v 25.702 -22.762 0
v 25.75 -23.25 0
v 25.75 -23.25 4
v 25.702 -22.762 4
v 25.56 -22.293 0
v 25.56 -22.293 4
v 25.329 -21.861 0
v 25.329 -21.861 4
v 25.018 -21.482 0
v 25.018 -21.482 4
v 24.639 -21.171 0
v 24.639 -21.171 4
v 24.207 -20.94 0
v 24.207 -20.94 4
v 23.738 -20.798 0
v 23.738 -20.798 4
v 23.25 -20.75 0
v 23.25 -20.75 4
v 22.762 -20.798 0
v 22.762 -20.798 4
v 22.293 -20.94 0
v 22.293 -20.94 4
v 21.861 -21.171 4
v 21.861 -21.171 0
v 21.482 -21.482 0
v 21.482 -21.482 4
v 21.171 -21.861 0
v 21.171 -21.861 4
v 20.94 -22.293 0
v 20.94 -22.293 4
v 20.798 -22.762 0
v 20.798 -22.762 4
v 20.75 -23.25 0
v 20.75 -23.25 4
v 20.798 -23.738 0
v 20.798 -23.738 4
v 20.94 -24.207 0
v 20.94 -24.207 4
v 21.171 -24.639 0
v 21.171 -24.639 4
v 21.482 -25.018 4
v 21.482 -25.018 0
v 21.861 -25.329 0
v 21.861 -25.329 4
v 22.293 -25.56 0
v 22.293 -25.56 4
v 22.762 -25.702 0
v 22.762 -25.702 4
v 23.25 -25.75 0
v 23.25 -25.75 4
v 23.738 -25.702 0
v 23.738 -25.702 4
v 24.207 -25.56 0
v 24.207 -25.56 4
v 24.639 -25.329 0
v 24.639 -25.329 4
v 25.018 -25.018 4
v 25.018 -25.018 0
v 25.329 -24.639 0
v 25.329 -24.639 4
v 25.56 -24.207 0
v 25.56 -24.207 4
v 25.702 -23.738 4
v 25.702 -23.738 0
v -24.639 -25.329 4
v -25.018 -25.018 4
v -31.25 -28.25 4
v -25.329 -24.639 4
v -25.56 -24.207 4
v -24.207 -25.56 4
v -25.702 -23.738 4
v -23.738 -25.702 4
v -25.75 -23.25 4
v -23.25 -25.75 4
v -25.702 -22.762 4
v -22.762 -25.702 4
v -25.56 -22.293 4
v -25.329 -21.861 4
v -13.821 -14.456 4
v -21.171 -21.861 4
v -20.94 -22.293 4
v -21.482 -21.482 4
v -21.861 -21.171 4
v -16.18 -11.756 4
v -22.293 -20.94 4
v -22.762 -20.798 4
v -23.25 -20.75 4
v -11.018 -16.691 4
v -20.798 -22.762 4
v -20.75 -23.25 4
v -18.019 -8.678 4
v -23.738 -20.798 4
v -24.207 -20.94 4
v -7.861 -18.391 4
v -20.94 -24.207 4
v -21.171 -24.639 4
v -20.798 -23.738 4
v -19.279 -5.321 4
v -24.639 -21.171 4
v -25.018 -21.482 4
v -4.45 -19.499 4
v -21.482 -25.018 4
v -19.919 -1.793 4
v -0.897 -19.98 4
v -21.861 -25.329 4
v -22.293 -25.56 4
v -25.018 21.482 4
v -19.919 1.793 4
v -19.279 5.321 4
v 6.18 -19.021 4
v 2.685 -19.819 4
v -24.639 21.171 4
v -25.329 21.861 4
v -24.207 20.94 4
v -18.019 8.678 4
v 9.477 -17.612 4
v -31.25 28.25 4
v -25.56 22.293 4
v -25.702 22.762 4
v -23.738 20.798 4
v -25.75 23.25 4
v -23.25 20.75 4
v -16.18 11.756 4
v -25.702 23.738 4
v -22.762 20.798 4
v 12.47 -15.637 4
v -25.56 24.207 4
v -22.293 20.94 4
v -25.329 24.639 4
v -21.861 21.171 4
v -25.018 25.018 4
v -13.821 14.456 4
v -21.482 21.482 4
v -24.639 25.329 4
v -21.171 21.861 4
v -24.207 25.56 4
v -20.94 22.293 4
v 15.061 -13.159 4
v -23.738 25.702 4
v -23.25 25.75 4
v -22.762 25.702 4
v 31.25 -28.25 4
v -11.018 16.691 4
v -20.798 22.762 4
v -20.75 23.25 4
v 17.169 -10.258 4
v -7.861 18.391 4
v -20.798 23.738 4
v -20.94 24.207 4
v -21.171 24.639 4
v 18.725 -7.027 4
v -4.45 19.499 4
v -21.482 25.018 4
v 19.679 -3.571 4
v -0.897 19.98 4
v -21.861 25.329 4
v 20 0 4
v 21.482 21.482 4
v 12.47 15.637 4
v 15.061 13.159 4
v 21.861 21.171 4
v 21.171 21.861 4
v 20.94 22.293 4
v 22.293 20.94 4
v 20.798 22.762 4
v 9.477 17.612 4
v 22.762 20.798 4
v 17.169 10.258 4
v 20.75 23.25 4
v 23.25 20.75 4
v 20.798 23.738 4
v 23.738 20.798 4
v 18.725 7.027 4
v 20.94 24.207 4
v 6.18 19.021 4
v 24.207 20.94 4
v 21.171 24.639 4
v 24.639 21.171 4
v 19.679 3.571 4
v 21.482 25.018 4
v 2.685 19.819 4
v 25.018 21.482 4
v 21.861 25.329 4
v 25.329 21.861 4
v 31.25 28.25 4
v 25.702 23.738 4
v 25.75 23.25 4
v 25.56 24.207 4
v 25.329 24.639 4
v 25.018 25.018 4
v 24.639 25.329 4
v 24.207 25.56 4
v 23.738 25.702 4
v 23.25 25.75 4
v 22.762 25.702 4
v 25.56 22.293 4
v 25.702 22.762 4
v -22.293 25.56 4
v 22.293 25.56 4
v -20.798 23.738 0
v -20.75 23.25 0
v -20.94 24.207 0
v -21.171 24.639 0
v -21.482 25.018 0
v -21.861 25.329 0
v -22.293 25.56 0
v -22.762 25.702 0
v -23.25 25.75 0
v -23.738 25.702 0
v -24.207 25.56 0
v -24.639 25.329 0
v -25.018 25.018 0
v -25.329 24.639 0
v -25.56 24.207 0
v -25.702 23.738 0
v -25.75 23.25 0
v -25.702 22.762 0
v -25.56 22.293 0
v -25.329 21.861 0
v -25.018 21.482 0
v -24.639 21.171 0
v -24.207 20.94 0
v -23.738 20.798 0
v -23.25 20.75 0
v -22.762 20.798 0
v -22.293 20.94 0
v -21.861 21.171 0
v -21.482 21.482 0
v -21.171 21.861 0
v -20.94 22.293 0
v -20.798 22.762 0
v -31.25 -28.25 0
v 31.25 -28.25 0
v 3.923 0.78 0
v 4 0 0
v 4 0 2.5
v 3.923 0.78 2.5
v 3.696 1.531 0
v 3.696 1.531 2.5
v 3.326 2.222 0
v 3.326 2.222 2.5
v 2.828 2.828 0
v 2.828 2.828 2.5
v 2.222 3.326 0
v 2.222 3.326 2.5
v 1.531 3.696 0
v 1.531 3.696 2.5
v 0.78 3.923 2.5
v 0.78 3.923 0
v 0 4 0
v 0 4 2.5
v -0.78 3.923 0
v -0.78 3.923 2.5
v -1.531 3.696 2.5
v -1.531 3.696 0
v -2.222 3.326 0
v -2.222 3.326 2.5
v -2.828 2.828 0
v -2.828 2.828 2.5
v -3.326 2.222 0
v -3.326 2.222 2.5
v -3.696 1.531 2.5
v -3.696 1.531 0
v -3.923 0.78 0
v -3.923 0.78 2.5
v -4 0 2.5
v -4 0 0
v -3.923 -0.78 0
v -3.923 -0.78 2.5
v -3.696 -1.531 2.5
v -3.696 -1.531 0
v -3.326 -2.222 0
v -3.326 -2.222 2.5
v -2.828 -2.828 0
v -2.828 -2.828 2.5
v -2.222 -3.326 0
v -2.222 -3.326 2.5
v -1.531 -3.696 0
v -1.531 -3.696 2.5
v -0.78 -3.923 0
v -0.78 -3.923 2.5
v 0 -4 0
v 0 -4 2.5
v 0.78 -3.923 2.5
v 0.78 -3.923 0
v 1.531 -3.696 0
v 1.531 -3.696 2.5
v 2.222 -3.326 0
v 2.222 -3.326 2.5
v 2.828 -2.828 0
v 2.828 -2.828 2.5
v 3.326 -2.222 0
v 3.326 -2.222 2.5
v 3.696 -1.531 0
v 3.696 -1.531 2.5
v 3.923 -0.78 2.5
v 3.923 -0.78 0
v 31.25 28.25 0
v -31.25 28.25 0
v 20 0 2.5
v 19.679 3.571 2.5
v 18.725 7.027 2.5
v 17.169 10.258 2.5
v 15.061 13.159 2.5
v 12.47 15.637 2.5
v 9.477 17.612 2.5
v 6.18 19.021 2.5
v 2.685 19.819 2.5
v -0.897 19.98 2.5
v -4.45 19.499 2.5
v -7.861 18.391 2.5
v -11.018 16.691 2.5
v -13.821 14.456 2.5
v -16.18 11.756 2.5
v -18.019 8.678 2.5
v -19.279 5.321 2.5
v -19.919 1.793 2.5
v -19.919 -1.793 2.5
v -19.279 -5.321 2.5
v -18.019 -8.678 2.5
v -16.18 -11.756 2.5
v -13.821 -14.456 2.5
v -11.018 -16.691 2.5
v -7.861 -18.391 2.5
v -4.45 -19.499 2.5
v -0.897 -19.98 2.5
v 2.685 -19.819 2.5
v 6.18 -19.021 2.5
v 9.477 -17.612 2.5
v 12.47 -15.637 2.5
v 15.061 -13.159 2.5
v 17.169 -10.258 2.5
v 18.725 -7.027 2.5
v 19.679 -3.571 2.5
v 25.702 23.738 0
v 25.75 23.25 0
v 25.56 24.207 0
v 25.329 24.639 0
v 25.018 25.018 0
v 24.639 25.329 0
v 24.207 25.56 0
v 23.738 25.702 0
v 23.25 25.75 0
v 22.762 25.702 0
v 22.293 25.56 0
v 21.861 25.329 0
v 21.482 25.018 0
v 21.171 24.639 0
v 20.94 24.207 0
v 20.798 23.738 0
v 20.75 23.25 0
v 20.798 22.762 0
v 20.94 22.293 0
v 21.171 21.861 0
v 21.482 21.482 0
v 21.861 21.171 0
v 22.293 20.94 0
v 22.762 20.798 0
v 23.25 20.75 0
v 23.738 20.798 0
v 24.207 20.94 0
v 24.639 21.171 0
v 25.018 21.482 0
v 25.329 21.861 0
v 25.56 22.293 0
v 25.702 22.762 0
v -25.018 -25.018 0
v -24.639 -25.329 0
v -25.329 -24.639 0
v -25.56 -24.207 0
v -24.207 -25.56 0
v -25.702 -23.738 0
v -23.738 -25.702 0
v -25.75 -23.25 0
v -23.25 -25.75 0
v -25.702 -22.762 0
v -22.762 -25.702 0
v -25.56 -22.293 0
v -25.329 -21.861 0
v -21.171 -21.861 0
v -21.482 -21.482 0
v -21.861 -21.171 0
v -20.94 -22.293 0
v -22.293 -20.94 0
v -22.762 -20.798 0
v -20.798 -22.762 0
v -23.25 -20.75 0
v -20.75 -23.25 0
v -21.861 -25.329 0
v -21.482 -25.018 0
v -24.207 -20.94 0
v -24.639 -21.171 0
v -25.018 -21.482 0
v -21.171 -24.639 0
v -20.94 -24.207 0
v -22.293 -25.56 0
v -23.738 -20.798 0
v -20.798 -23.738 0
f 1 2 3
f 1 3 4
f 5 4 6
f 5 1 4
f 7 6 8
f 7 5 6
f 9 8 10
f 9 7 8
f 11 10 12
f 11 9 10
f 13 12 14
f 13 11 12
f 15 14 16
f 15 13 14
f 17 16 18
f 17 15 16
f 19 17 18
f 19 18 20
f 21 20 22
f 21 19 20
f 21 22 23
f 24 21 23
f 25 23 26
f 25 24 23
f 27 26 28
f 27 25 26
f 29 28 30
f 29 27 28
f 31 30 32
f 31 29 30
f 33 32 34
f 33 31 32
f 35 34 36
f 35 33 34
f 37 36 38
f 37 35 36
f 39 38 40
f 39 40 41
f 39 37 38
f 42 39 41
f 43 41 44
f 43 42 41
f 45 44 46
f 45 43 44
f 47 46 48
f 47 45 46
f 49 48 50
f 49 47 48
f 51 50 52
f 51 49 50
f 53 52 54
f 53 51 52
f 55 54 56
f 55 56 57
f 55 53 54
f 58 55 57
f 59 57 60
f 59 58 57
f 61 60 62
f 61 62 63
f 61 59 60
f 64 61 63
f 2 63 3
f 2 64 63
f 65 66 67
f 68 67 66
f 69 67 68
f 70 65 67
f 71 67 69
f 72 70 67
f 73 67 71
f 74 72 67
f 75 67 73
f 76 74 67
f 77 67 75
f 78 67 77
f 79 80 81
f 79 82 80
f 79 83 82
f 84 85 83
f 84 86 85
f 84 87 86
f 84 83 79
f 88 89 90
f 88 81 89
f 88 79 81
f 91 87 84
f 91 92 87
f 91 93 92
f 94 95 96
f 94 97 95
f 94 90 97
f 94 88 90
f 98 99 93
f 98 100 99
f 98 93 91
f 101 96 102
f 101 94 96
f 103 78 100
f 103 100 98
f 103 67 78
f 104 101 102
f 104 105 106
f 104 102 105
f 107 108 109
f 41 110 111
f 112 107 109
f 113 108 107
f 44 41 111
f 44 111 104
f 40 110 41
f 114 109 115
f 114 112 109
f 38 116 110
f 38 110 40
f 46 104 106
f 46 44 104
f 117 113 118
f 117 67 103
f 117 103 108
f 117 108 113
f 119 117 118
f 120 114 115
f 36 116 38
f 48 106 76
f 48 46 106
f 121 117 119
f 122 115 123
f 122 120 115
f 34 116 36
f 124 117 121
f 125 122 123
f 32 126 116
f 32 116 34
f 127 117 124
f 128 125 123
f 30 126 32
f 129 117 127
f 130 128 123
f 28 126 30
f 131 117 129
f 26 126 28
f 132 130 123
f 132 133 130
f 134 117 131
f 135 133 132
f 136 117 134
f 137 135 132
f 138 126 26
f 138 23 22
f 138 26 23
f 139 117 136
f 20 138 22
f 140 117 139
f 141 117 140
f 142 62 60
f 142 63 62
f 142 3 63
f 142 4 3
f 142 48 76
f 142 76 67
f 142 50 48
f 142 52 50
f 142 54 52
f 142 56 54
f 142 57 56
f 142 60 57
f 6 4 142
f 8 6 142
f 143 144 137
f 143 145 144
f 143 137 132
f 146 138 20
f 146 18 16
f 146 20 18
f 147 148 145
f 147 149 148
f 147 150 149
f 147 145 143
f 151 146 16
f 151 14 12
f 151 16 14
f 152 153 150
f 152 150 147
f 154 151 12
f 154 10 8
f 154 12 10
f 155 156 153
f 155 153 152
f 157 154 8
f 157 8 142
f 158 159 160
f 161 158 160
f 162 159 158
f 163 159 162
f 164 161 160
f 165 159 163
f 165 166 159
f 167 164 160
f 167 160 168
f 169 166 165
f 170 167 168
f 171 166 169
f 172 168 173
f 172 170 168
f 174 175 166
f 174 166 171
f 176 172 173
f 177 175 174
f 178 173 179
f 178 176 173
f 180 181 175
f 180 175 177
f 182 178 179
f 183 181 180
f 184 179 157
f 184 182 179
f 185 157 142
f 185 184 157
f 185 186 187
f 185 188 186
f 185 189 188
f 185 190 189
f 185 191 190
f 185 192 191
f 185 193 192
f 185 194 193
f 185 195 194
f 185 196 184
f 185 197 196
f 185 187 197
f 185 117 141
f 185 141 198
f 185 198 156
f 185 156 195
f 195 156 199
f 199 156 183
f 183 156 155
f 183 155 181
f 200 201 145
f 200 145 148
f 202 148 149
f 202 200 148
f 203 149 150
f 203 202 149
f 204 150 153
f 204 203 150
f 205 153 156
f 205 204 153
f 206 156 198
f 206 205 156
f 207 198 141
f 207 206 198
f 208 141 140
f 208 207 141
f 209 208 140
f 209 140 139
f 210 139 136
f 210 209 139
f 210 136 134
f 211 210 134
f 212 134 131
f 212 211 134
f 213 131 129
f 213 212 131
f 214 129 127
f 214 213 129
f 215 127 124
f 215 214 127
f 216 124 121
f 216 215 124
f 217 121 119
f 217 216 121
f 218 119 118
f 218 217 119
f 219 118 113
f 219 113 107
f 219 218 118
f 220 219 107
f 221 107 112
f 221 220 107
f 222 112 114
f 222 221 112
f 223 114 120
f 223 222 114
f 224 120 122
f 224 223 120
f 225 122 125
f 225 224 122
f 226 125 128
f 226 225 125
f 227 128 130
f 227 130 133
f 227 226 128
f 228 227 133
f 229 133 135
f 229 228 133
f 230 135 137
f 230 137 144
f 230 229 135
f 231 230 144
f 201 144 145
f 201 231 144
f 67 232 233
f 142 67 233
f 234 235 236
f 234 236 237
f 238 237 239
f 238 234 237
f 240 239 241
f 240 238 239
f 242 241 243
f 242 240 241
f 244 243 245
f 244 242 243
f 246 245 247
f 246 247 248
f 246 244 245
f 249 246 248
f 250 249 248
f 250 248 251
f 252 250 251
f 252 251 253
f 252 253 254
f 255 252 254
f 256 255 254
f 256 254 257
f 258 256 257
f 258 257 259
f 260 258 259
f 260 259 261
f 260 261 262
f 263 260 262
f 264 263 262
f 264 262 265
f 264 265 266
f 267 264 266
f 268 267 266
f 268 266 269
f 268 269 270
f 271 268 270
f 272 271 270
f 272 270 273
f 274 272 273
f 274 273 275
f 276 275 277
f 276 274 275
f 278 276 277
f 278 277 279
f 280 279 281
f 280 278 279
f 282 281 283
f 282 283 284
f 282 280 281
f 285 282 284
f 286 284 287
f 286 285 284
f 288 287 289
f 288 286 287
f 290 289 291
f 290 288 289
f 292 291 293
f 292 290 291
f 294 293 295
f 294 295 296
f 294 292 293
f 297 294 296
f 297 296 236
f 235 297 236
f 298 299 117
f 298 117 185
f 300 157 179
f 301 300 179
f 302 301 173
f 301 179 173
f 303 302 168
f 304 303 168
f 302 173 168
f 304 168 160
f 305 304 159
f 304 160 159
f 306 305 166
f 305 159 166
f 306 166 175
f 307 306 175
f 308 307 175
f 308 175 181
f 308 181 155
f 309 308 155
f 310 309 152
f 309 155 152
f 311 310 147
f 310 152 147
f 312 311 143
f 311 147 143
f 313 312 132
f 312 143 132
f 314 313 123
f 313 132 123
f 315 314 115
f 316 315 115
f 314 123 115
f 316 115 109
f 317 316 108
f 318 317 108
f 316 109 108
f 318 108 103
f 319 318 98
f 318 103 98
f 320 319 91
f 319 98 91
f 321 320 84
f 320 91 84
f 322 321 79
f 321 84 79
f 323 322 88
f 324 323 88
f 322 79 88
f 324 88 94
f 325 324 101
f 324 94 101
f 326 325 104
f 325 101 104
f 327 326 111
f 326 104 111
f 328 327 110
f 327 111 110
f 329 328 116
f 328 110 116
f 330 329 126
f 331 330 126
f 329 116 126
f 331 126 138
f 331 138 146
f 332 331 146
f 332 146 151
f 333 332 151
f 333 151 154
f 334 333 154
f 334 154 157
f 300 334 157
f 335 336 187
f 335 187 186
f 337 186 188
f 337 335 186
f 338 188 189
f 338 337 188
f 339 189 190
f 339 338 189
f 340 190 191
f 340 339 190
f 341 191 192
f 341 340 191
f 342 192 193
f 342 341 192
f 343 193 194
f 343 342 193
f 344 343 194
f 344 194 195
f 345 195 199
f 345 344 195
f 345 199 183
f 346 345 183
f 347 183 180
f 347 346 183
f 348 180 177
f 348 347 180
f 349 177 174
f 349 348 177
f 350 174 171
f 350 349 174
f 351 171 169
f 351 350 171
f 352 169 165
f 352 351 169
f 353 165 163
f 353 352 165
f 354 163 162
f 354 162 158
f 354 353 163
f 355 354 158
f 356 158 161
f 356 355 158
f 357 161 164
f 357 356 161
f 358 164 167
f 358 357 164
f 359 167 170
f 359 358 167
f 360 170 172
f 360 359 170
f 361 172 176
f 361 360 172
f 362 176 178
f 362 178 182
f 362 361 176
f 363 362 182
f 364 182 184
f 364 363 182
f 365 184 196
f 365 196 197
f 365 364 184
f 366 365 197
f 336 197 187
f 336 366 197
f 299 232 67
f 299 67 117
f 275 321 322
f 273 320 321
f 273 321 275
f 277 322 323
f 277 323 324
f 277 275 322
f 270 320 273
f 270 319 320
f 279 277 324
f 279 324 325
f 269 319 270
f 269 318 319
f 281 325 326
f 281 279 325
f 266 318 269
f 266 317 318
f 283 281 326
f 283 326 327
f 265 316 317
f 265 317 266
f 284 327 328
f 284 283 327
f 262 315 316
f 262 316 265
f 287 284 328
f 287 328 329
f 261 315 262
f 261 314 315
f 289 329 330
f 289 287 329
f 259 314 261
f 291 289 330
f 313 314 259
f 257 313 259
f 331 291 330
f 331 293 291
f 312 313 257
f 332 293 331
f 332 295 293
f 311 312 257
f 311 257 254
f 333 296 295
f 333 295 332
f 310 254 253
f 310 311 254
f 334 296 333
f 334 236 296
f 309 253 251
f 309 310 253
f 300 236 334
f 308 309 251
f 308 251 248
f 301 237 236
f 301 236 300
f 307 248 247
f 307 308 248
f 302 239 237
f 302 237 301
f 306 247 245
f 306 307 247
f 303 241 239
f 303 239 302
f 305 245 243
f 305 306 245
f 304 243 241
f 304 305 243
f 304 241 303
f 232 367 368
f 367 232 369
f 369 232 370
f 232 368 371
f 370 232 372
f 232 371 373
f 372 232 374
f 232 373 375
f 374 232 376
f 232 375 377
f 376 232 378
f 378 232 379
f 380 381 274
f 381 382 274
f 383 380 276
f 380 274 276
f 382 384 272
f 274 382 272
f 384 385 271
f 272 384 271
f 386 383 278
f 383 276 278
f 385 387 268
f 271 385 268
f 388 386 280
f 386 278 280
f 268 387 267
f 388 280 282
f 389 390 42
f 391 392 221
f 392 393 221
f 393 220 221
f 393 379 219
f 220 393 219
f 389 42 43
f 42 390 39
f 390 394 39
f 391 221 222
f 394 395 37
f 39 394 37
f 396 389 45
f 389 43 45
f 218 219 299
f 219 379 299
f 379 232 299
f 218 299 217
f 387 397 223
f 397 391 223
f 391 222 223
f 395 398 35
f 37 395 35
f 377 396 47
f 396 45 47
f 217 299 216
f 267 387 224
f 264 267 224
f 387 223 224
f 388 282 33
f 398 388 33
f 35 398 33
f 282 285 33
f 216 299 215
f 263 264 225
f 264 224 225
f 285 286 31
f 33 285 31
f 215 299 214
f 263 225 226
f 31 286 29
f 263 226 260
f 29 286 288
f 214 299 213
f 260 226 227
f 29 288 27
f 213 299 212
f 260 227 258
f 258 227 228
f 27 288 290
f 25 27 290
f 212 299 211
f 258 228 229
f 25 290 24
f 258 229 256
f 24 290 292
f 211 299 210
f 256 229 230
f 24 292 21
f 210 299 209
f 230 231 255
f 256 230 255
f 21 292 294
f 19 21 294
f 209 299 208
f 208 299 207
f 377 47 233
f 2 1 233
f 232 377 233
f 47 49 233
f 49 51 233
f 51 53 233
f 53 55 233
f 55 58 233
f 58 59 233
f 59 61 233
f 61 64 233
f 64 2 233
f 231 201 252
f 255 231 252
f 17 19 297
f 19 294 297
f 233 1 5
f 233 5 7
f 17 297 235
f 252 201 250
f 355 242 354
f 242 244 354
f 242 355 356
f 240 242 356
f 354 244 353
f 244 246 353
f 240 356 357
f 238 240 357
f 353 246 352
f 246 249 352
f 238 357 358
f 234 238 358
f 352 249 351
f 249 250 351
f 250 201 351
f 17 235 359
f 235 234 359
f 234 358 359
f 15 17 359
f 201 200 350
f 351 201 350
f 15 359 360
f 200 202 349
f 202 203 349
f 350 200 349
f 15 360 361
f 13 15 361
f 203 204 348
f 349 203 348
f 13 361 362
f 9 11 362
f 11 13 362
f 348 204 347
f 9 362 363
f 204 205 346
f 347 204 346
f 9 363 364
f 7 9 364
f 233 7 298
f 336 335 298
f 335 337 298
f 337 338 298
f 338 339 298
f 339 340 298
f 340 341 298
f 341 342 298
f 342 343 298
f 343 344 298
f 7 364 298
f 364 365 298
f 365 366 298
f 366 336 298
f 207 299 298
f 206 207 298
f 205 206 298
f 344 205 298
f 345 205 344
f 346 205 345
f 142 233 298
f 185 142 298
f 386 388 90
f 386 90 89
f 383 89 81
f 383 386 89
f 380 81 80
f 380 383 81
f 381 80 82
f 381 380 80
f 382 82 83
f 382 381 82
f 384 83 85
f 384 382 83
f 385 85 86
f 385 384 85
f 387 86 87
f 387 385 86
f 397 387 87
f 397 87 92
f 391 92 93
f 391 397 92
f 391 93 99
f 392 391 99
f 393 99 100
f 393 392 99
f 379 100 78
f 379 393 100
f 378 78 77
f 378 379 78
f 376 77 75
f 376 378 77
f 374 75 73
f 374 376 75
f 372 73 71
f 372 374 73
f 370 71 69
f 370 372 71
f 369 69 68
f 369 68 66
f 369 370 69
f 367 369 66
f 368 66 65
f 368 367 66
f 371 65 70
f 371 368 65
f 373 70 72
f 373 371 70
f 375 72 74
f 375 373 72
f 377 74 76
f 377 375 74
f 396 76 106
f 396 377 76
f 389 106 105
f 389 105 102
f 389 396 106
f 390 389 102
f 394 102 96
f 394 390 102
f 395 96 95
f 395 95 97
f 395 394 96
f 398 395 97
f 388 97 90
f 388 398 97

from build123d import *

# Parameters (mm, degrees)
SKETCH_W      = 62.5
SKETCH_H      = 56.5
SKETCH_R      = 2.5
SKETCH_R_2    = 4
PAD_DEPTH     = 4
SKETCH001_R   = 20
SKETCH001_R_2 = 4
POCKET_DEPTH  = 1.5


with BuildPart() as part:
    # Sketch → Pad (new body)
    with BuildSketch(Plane.XY):
        Rectangle(SKETCH_W, SKETCH_H)
        with Locations((23.25, -23.25)):
            Circle(SKETCH_R, mode=Mode.SUBTRACT)
        with Locations((23.25, 23.25)):
            Circle(SKETCH_R, mode=Mode.SUBTRACT)
        with Locations((-23.25, 23.25)):
            Circle(SKETCH_R, mode=Mode.SUBTRACT)
        with Locations((-23.25, -23.25)):
            Circle(SKETCH_R, mode=Mode.SUBTRACT)
        Circle(SKETCH_R_2, mode=Mode.SUBTRACT)
    extrude(amount=PAD_DEPTH)

    # Sketch001 (on Face11 of Pad) → Pocket (cut)
    with BuildSketch(Plane.XY.offset(4)):
        Circle(SKETCH001_R)
        Circle(SKETCH001_R_2, mode=Mode.SUBTRACT)
    extrude(amount=-POCKET_DEPTH, mode=Mode.SUBTRACT)


solid = part.part
